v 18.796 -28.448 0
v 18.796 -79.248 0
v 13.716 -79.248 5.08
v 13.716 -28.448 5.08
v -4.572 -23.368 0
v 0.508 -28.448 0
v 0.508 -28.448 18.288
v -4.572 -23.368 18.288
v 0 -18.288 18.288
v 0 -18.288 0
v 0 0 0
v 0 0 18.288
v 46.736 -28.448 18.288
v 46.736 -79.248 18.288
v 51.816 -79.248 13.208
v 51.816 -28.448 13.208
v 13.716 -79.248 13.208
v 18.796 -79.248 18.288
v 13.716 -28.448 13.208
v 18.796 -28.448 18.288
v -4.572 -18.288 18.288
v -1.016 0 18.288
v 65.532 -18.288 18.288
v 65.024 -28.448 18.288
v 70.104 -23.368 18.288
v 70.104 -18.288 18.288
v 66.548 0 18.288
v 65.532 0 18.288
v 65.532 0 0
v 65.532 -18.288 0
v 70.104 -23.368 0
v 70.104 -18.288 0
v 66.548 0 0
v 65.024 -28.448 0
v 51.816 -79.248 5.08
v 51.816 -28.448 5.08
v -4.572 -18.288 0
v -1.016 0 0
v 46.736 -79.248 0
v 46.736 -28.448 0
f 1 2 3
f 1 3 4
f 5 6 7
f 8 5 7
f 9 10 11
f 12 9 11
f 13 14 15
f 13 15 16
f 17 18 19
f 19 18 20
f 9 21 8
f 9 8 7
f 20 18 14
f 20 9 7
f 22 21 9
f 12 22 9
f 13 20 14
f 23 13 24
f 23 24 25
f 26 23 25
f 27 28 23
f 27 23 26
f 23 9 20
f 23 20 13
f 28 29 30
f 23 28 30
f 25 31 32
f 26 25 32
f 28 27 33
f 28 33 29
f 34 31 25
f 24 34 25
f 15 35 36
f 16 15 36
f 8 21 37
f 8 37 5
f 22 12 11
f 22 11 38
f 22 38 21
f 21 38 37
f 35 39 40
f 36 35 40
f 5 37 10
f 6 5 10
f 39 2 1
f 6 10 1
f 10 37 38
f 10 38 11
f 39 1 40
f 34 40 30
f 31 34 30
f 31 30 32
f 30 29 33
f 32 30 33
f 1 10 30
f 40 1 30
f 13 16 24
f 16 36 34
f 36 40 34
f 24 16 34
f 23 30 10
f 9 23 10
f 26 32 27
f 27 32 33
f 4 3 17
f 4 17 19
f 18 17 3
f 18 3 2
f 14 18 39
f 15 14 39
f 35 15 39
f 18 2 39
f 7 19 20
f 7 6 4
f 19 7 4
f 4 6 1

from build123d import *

# Parameters (mm, degrees)
F0_W     = 38.1
F0_H     = 50.8
F1_DEPTH = 18.288
F2_SIZE  = 5.08


with BuildPart() as f1:
    # F0 (on Top) → F1 (new body)
    with BuildSketch(Plane.XY):
        with Locations((32.766, -53.848)):
            Rectangle(F0_W, F0_H)
        Polygon((65.532, -18.288), (0, -18.288), (0, 0), (-1.016, 0), (-4.572, -18.288), (-4.572, -28.448), (13.716, -28.448), (51.816, -28.448), (70.104, -28.448), (70.104, -18.288), (66.548, 0), (65.532, 0), align=None)
    extrude(amount=F1_DEPTH)

    # F2
    f2_edges = [f1.edges().sort_by_distance(p)[0] for p in [
        (13.716, -53.848, 18.288),
        (51.816, -53.848, 18.288),
        (51.816, -53.848, 0),
        (13.716, -53.848, 0),
        (-4.572, -28.448, 9.144),
        (70.104, -28.448, 9.144),
    ]]
    chamfer(f2_edges, length=F2_SIZE)


solid = f1.part
